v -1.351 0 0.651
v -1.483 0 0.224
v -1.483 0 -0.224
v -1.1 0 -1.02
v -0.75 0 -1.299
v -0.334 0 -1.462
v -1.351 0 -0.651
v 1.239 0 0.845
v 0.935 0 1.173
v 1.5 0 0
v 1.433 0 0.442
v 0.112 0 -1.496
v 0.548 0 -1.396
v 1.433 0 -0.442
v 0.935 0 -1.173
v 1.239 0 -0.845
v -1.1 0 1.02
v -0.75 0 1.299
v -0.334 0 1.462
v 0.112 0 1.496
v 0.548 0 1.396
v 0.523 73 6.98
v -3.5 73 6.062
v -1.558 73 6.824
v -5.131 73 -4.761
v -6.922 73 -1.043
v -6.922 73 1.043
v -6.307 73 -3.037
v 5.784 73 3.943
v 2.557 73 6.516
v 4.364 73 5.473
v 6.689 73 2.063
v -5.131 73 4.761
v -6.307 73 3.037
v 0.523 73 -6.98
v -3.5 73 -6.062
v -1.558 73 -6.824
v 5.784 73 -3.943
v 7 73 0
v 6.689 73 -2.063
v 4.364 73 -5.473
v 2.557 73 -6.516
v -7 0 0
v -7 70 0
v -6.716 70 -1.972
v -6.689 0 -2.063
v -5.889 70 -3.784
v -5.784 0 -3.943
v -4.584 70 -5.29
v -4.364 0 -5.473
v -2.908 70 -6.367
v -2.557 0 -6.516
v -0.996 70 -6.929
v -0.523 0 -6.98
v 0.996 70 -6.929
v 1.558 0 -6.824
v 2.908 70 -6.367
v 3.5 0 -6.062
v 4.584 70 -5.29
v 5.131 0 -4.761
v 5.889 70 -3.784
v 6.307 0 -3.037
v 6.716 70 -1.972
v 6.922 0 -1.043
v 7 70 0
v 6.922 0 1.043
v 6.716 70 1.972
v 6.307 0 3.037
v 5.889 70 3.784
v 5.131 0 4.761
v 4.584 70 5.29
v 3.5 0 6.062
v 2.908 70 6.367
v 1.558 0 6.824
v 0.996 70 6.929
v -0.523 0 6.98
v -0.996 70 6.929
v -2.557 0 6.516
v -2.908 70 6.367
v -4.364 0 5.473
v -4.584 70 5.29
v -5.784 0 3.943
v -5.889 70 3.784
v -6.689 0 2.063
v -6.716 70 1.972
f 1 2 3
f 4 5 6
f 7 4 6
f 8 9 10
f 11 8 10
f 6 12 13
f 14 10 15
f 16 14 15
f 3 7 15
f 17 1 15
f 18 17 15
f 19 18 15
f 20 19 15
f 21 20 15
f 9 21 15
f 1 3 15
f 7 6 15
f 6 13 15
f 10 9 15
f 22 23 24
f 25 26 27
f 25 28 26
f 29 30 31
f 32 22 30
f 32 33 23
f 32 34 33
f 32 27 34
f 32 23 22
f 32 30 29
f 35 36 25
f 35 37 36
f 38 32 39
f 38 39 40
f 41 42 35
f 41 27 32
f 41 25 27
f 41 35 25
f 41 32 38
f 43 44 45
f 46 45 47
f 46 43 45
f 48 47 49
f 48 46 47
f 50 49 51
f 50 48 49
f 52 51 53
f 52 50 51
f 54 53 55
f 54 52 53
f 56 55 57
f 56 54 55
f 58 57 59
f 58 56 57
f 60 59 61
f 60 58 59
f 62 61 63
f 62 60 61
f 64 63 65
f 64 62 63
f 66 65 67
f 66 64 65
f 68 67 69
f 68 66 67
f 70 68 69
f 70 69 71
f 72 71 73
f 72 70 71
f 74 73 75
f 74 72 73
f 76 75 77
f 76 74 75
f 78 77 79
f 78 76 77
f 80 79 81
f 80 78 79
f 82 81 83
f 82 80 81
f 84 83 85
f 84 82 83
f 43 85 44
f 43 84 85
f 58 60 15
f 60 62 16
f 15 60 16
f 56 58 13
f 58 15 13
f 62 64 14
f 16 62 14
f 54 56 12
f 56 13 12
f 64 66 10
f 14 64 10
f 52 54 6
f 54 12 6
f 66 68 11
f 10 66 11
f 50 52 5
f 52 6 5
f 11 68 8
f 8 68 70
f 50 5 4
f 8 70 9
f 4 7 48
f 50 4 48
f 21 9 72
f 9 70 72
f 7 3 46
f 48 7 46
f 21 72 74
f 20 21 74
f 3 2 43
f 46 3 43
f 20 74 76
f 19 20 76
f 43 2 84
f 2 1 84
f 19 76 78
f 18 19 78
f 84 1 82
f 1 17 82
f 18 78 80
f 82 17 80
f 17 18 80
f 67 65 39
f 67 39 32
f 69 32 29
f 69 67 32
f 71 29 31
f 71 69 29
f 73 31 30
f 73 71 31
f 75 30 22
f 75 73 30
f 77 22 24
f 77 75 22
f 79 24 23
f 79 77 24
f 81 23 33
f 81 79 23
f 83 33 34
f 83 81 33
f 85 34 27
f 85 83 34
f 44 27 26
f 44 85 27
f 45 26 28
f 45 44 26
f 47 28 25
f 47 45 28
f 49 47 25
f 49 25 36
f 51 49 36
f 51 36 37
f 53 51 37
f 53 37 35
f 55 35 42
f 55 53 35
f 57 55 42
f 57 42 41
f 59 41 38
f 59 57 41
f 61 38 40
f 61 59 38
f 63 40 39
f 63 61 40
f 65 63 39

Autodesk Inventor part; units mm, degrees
ref_plane "YZ Plane" through (0, 0, 0) normal (1, 0, 0) x (0, 1, 0)
ref_plane "XZ Plane" through (0, 0, 0) normal (0, 1, 0) x (-1, 0, 0)
ref_plane "XY Plane" through (0, 0, 0) normal (0, 0, 1) x (1, 0, 0)
sketch "スケッチ1" plane through (0, 0, 0) normal (0, 1, 0) x (-1, 0, 0)
  circle A0 centre (0, 0) radius 7
  dimension "d0" = 14
extrude "押し出し1" add sketch "スケッチ1" along normal blind 70
sketch "スケッチ2" plane through (0, 70, 0) normal (0, 1, 0) x (1, 0, 0)
  circle A0 centre (0, 0) radius 7 projected
sketch "スケッチ3" plane through (0, 70, 0) normal (0, 1, 0) x (1, 0, 0)
  circle A0 centre (0, 0) radius 7 projected
  circle A1 centre (0, 0) radius 27.5
  dimension "d3" = 55
extrude "押し出し2" add sketch "スケッチ3" along normal blind 3
extrude "押し出し3" add sketch "スケッチ2" along normal blind 3
sketch "スケッチ4" plane through (0, 73, 0) normal (0, 1, 0) x (1, 0, 0)
  circle A0 centre (0, 0) radius 27.5 projected
  circle A1 centre (0, 0) radius 25
  line L0 (0, 0) -> (17.6777, 17.6777)
  line L1 (0, 0) -> (25, 0) construction
  circle A2 centre (17.6777, 17.6777) radius 1.5
  circle A3 centre (-17.6777, 17.6777) radius 1.5
  circle A4 centre (-17.6777, -17.6777) radius 1.5
  circle A5 centre (17.6777, -17.6777) radius 1.5
  dimension "d8" = 50
  dimension "d9" = 45
  dimension "d10" = 3
  dimension "d13" = 360
hole "穴1" at (0, 73, 0) at (-17.6777, 73, -17.6777) at (17.6777, 73, -17.6777) at (17.6777, 73, 17.6777) at (-17.6777, 73, 17.6777) direction (0, -1, 0) diameter 3 depth 8 tip angle 118
sketch "スケッチ6" plane through (0, 70, 0) normal (0, -1, 0) x (1, 0, 0)
  circle A0 centre (17.6777, 17.6777) radius 1.5 projected
  circle A1 centre (-17.6777, -17.6777) radius 1.5 projected
  circle A2 centre (17.6777, -17.6777) radius 1.5 projected
  circle A3 centre (-17.6777, 17.6777) radius 1.5 projected
  circle A4 centre (0, 0) radius 7 projected
  circle A5 centre (0, 0) radius 27.5 projected
extrude "押し出し5" cut sketch "スケッチ6" against normal blind 3
sketch "スケッチ7" plane through (0, 73, 0) normal (0, 1, 0) x (1, 0, 0)
  circle A0 centre (0, 0) radius 1.5 projected
  circle A1 centre (0, 0) radius 1.5
extrude "押し出し6" add sketch "スケッチ7" against normal blind 73
properties part number "知能ロボコンばね受け"
